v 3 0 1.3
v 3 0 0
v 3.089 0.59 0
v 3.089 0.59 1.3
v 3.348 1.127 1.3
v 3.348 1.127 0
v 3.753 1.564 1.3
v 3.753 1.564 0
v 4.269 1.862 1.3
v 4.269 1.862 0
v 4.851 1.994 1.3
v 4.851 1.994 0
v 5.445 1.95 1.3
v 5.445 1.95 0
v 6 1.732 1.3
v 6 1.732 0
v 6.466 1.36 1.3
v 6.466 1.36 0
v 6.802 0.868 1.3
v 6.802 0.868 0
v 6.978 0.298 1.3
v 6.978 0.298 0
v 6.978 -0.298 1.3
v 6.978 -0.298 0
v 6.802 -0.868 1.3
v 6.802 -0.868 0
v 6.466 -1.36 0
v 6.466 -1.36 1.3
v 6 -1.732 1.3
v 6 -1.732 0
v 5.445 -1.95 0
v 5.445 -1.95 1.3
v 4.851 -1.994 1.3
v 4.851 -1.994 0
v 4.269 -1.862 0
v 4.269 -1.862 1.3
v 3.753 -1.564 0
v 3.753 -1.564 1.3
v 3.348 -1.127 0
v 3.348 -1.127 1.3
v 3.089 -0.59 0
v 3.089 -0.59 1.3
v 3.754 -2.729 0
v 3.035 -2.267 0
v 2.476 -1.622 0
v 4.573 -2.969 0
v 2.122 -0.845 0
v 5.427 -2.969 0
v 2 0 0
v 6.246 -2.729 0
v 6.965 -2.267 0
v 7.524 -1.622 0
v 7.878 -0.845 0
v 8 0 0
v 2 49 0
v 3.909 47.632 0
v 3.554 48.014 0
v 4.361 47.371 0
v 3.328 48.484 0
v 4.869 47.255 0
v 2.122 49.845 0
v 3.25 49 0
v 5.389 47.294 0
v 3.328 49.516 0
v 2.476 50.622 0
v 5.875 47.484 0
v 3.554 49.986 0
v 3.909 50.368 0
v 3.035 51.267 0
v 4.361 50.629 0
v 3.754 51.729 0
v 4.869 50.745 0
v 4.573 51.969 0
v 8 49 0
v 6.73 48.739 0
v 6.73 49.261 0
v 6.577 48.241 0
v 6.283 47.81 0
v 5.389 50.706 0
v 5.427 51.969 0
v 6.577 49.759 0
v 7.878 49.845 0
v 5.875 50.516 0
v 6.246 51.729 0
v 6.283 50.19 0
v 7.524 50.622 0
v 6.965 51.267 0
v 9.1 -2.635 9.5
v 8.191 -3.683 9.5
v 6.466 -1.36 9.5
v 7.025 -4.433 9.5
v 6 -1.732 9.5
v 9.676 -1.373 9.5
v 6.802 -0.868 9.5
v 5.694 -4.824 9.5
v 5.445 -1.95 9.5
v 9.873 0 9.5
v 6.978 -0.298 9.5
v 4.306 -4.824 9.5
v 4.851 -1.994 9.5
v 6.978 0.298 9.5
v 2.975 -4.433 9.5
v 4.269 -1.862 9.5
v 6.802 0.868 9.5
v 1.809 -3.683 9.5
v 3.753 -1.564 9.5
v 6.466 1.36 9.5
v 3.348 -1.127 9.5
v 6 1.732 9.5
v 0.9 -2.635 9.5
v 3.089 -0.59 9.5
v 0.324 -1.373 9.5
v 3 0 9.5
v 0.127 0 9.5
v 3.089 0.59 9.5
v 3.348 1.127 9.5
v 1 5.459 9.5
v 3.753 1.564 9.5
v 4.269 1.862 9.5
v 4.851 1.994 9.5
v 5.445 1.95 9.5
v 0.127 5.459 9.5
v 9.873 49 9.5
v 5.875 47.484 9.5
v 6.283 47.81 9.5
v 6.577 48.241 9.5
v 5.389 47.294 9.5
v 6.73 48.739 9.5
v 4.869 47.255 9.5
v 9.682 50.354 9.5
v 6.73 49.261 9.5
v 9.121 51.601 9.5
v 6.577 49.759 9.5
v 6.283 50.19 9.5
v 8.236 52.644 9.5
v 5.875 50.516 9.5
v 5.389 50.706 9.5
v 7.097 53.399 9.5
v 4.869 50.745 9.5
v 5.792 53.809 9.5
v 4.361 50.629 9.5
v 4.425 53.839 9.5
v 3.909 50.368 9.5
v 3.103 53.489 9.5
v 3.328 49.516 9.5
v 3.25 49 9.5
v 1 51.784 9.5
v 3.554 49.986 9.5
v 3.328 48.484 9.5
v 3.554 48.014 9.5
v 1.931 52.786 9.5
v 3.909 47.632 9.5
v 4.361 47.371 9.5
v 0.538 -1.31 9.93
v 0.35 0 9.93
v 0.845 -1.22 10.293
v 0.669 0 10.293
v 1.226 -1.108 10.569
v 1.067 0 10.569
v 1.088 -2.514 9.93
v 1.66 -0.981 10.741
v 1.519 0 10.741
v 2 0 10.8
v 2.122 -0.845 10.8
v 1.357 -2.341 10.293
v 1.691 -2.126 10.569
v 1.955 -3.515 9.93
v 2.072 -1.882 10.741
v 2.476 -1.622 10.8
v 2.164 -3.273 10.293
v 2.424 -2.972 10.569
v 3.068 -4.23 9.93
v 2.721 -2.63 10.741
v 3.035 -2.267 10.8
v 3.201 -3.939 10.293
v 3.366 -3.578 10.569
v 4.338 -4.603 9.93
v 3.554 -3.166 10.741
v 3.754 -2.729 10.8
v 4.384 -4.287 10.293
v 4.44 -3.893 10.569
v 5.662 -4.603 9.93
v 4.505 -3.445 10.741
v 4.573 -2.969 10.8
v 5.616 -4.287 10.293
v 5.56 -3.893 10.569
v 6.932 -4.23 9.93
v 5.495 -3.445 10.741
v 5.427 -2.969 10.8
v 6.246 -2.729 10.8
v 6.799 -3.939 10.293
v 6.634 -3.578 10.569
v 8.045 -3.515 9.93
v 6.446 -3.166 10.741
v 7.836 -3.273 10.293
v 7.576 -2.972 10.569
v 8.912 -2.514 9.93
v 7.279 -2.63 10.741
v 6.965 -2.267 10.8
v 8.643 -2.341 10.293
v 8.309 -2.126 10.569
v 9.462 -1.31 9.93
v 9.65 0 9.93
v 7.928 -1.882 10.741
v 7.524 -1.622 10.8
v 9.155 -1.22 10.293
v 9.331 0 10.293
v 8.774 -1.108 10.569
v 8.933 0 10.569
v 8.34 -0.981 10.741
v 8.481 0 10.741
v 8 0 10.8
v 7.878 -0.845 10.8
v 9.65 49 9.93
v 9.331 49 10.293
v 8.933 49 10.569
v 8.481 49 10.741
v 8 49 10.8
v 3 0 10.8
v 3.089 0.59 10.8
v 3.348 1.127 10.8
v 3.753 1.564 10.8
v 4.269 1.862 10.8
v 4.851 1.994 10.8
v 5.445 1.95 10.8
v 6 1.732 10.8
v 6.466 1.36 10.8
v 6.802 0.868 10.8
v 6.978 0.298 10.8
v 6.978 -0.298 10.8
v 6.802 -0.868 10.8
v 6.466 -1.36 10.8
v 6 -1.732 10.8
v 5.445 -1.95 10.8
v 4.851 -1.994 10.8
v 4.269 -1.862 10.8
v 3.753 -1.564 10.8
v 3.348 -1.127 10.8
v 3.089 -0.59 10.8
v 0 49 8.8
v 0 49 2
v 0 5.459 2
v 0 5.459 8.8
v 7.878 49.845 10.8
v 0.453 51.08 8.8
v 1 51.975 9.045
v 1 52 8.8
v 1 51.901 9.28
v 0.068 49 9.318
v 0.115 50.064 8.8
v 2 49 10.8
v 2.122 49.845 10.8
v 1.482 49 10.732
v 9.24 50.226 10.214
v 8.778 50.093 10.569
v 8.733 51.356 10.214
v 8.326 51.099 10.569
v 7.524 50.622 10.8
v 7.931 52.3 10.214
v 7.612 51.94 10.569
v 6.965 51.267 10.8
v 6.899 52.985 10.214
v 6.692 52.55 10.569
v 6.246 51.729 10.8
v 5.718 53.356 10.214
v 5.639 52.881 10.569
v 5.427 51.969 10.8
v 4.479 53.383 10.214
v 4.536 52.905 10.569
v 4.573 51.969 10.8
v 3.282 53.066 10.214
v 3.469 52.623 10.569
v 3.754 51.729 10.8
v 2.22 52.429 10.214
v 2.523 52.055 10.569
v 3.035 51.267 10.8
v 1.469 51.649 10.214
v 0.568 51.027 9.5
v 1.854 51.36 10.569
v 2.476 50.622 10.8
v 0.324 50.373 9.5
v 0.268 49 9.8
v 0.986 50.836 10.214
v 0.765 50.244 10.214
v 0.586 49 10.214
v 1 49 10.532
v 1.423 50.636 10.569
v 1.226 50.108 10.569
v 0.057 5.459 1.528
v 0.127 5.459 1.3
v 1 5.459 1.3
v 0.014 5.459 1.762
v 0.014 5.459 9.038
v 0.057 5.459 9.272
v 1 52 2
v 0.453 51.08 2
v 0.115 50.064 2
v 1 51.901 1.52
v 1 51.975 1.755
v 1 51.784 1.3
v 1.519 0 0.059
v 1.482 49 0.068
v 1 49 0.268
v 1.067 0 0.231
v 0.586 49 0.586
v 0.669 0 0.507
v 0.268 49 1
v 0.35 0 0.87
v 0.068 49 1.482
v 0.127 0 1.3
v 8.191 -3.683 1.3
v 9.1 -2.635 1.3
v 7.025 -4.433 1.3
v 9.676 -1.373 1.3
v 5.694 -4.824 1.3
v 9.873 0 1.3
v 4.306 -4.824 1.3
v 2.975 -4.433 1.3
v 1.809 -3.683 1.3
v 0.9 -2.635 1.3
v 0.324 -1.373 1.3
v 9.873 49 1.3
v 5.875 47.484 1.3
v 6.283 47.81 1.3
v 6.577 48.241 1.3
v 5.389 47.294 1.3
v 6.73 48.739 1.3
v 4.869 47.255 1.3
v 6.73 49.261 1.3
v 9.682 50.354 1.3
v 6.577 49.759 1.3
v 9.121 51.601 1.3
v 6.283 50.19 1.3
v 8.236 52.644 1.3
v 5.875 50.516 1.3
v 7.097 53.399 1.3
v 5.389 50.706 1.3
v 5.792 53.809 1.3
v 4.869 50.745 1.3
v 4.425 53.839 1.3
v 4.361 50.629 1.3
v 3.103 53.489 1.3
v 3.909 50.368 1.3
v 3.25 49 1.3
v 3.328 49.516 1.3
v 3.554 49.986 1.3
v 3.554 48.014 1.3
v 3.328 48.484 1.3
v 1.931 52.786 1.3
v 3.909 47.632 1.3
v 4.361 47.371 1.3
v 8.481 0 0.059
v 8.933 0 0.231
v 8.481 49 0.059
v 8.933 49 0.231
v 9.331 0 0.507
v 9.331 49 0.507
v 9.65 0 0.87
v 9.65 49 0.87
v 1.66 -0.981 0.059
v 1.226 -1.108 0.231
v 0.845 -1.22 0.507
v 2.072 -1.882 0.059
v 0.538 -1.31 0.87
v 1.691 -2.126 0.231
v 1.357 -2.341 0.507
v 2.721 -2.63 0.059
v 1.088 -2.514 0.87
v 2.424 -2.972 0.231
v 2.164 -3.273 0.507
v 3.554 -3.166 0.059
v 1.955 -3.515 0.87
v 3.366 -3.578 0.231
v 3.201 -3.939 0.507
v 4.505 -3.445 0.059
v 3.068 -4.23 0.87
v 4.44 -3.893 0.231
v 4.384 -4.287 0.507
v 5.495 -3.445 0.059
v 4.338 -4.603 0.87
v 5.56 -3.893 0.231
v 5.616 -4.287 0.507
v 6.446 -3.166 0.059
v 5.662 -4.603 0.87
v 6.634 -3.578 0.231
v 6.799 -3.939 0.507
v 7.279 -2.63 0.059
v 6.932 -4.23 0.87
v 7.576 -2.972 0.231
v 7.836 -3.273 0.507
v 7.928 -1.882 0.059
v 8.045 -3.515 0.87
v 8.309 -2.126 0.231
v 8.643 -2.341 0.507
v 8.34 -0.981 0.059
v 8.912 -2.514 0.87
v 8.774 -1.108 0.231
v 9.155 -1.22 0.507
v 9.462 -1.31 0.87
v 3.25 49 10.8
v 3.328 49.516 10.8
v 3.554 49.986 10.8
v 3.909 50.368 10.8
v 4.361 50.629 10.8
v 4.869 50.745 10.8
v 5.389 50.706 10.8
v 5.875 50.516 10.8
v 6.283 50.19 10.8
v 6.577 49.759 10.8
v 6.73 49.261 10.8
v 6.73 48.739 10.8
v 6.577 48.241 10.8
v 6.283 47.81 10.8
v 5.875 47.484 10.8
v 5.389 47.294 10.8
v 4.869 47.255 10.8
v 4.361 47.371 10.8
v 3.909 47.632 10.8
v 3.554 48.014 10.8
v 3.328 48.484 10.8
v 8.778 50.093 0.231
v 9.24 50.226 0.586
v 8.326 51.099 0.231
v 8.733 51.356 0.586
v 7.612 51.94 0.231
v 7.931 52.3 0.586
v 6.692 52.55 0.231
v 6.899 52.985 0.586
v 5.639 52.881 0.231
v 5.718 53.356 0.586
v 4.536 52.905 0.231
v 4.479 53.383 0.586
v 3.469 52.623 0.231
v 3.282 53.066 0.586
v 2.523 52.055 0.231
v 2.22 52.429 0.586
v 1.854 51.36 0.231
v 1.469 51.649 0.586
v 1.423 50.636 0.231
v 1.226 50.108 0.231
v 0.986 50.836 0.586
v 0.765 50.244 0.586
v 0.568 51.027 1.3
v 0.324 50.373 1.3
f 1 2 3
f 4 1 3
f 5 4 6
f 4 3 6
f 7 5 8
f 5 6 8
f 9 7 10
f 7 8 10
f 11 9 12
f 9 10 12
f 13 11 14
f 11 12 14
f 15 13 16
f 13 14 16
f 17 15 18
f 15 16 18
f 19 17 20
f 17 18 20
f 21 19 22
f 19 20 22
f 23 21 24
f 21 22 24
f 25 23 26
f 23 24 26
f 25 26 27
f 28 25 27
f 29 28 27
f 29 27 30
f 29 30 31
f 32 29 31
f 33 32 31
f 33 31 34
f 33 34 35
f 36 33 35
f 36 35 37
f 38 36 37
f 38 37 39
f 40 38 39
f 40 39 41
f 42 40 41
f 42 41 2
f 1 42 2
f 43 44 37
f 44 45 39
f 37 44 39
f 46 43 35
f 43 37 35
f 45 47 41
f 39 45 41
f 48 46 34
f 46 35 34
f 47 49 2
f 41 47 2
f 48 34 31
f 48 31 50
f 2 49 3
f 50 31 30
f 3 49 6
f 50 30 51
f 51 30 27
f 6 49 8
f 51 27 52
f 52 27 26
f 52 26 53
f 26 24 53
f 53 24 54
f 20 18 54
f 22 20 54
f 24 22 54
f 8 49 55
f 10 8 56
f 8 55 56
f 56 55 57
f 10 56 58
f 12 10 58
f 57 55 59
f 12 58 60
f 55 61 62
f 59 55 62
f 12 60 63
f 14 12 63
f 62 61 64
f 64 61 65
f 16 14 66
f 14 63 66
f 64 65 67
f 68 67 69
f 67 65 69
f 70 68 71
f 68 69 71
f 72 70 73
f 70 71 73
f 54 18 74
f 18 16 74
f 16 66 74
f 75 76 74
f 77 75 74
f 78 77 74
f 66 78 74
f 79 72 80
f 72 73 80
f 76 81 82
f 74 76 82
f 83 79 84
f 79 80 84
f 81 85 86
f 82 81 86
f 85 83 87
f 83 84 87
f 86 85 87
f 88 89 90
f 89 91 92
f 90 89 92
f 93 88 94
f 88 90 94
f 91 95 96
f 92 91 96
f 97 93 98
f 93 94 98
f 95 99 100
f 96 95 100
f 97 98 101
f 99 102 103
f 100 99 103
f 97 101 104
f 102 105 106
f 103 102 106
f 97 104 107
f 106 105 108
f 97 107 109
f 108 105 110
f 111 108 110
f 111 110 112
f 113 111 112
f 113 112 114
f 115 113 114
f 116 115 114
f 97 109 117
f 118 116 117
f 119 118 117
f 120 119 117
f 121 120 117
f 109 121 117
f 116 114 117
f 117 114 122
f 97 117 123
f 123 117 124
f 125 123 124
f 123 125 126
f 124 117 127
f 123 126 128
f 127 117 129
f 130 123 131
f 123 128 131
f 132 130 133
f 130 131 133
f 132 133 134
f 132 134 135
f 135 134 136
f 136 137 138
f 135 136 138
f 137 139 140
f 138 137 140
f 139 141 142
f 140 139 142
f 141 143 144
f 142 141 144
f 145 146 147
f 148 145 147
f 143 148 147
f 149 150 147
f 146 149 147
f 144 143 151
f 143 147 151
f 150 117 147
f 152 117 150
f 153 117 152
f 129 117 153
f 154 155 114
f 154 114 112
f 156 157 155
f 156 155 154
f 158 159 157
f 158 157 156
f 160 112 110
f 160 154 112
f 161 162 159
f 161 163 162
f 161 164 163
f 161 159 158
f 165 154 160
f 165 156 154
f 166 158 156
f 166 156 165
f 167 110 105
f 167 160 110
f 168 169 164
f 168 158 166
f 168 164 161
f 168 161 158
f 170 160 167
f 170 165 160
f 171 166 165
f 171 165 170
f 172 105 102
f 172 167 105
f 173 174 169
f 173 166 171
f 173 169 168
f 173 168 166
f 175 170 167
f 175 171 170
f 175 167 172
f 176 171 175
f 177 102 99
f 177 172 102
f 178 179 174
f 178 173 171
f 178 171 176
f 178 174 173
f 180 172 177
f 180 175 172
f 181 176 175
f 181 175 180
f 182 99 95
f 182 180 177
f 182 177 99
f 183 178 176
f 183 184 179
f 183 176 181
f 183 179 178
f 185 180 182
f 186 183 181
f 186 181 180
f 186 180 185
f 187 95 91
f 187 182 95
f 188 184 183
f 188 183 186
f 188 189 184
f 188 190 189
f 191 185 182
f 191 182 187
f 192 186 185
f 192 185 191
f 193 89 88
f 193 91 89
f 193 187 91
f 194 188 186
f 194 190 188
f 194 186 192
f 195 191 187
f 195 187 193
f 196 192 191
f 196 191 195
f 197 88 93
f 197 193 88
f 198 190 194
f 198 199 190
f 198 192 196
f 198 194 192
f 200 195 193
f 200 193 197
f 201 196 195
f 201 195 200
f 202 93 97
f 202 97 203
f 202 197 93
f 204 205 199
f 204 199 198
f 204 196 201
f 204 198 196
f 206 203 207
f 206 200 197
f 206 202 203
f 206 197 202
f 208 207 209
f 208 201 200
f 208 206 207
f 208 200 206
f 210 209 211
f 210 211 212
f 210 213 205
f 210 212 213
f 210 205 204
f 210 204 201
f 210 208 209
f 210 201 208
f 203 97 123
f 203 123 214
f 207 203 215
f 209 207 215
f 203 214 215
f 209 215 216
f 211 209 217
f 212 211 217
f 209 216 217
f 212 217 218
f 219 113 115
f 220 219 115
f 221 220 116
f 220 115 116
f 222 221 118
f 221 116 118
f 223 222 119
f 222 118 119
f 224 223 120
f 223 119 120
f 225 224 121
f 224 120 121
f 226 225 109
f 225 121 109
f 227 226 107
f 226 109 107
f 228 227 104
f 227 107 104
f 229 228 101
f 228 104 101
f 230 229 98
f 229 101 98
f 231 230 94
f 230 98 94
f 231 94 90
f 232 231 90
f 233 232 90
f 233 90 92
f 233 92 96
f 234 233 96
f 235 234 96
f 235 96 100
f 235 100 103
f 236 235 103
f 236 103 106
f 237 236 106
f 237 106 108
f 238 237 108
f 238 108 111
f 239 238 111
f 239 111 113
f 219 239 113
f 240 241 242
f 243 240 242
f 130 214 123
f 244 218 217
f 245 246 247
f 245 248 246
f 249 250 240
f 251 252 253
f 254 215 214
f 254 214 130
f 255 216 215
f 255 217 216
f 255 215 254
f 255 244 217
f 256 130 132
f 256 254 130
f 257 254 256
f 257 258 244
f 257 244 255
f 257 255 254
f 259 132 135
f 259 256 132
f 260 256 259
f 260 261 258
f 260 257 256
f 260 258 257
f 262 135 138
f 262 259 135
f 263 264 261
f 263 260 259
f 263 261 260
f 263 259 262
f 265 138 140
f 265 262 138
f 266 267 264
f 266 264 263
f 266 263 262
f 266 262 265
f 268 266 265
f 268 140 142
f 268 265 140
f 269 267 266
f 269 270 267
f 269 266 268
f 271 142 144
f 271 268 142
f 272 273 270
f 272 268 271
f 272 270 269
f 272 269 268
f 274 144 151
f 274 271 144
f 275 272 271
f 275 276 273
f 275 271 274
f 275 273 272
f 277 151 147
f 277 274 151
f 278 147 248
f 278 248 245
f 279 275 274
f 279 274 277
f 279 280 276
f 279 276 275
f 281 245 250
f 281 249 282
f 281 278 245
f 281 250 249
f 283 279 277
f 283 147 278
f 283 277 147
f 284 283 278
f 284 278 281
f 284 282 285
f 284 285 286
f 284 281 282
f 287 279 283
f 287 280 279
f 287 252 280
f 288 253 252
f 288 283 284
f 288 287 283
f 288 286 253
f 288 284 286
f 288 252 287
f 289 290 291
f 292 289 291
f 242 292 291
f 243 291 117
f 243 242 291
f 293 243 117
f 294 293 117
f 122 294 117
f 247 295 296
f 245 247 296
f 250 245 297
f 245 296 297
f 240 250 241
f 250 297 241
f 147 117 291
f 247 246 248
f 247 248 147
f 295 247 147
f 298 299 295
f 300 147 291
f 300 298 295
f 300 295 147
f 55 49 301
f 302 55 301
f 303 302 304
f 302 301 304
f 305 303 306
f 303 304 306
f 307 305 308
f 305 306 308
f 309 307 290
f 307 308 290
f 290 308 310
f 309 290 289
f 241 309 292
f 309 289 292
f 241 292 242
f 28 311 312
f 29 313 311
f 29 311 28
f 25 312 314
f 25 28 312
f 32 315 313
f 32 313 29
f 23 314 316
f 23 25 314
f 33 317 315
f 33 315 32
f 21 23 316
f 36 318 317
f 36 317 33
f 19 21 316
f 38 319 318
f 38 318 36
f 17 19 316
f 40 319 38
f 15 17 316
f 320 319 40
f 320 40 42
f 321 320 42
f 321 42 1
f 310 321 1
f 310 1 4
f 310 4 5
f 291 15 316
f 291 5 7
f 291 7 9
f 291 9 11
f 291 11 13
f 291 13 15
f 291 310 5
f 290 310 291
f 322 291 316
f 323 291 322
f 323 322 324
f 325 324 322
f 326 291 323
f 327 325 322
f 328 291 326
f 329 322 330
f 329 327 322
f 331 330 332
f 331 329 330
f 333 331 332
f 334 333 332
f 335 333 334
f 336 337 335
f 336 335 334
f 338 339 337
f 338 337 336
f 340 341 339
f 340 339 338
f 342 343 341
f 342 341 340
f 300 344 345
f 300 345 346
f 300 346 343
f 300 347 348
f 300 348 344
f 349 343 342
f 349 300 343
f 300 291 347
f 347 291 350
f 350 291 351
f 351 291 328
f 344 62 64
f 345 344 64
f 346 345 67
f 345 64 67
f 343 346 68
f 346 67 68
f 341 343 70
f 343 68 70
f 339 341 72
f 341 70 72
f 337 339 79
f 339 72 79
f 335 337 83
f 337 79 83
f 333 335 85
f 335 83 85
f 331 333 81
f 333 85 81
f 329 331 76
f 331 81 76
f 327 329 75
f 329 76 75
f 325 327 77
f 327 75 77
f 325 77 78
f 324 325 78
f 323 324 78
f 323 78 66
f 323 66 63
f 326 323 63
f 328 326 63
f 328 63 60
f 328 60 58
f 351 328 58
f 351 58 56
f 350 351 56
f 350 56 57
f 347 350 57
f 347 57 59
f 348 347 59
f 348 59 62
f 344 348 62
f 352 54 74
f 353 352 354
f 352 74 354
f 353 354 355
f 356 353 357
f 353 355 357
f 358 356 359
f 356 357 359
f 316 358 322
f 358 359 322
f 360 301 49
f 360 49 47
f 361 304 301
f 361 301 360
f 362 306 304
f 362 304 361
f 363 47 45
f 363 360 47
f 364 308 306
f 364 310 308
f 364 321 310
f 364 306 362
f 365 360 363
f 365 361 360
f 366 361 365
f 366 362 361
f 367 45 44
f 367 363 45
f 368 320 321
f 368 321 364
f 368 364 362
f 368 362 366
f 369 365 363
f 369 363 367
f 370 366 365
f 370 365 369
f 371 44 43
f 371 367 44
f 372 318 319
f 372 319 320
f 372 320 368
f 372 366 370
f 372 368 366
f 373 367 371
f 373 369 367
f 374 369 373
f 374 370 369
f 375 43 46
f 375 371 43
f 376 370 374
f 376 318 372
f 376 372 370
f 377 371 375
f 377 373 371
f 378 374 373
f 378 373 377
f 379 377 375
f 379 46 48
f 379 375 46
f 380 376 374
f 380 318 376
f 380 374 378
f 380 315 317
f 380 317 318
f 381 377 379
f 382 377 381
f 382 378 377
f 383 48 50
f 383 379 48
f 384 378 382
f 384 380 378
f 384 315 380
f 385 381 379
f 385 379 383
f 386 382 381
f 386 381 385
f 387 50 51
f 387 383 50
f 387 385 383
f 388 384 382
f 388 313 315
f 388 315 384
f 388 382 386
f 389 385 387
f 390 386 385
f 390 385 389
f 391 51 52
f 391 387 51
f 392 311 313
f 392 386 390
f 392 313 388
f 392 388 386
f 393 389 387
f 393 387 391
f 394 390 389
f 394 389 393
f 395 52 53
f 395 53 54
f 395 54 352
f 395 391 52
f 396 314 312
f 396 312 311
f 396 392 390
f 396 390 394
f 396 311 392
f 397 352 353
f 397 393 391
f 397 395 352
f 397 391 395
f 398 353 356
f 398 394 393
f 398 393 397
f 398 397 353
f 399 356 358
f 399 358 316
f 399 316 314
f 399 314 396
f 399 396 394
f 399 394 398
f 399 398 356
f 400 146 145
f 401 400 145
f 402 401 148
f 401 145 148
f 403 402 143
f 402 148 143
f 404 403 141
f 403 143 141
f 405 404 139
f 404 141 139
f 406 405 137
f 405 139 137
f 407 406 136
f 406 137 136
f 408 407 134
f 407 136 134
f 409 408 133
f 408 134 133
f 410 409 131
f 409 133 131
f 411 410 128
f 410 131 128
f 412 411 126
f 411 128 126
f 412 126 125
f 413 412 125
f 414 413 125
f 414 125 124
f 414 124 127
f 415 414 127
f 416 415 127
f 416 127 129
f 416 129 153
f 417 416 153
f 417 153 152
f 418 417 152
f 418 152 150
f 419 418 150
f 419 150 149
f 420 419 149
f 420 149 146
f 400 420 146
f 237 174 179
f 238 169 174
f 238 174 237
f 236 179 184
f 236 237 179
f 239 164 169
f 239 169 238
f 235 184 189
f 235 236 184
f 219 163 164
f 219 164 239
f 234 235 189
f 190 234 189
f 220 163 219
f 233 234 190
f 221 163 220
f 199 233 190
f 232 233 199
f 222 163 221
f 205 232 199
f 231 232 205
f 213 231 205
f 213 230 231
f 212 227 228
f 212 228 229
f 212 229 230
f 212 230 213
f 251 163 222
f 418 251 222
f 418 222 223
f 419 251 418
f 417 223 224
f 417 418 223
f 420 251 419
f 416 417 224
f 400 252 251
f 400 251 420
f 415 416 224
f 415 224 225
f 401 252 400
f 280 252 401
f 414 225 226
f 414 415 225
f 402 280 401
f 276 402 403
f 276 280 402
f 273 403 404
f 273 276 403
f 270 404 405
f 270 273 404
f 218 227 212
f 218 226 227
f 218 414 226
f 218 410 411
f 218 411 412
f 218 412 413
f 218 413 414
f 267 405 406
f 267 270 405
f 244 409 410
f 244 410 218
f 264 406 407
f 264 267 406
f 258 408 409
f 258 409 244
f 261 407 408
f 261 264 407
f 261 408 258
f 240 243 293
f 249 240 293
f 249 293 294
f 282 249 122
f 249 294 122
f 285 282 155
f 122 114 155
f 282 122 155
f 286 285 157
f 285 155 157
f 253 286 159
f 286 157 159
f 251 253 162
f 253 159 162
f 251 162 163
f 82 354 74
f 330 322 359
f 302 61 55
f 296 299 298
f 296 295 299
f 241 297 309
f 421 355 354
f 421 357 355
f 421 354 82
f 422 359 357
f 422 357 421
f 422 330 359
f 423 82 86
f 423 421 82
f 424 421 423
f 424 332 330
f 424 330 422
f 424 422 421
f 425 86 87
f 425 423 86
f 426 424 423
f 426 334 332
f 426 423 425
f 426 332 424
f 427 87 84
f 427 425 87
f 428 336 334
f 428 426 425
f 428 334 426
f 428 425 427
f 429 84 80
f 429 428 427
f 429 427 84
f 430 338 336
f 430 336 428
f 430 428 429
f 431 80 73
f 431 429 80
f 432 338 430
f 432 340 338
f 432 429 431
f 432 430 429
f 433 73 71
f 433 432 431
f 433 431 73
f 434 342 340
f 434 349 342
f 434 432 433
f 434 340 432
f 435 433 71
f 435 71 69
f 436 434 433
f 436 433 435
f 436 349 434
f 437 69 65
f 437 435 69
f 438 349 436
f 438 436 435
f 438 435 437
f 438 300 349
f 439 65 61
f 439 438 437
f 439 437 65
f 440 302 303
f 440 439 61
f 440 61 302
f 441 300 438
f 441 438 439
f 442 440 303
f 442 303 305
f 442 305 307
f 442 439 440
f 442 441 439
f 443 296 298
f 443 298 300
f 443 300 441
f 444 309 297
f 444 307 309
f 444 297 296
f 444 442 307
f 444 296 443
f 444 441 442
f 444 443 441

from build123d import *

# Parameters (mm, degrees)
BASE_EXTRUSION_DEPTH    = 10.8
CONG_1_R                = 2
CONG_3_R                = 2
ENL_V_MAT_EXTRU_4_DEPTH = 9
ESQUISSE7_W             = 8.2
ESQUISSE7_H             = 10.06
ENL_V_MAT_EXTRU_5_DEPTH = 9
ESQUISSE8_R             = 2
ESQUISSE8_R_2           = 1.75
ENL_V_MAT_EXTRU_6_DEPTH = 56.825441717


with BuildPart() as part:
    # Esquisse1 → Base-Extrusion (new body)
    with BuildSketch(Plane.XY):
        with BuildLine():
            Line((0, 49), (0, 0))
            ThreePointArc((0, 0), (5, -5), (10, 0))
            Line((10, 0), (10, 49))
            ThreePointArc((10, 49), (5, 54), (0, 49))
        make_face()
    extrude(amount=BASE_EXTRUSION_DEPTH)

    # Congé1
    cong_1_edges = [part.edges().sort_by_distance(p)[0] for p in [
        (5, -5, 10.8),
        (10, 24.5, 10.8),
        (5, 54, 10.8),
        (0, 24.5, 10.8),
    ]]
    fillet(cong_1_edges, radius=CONG_1_R)

    # Congé3
    cong_3_edges = [part.edges().sort_by_distance(p)[0] for p in [
        (10, 24.5, 0),
        (5, -5, 0),
        (0, 24.5, 0),
        (5, 54, 0),
    ]]
    fillet(cong_3_edges, radius=CONG_3_R)

    # Esquisse6 → Enlèv. mat.-Extru.4 (cut)
    with BuildSketch(Plane(origin=(10, 0, 0), x_dir=(0, 0, -1), z_dir=(1, 0, 0))):
        Polygon((-9.5, 58.014149953), (-9.5, -9.353860788), (-1.3, -9.353860788), (-1.3, 56.548715687), align=None)
    extrude(amount=-ENL_V_MAT_EXTRU_4_DEPTH, mode=Mode.SUBTRACT)

    # Esquisse7 → Enlèv. mat.-Extru.5 (cut)
    with BuildSketch(Plane.ZY):
        with Locations((5.4, 0.429072807)):
            Rectangle(ESQUISSE7_W, ESQUISSE7_H)
    extrude(amount=-ENL_V_MAT_EXTRU_5_DEPTH, mode=Mode.SUBTRACT)

    # Esquisse8 → Enlèv. mat.-Extru.6 (cut, through all)
    with BuildSketch(Plane(origin=(0, 0, 0), x_dir=(-1, 0, 0), z_dir=(0, 0, -1))):
        with Locations((-5, 0)):
            Circle(ESQUISSE8_R)
        with Locations((-5, 49)):
            Circle(ESQUISSE8_R_2)
    extrude(amount=-ENL_V_MAT_EXTRU_6_DEPTH, mode=Mode.SUBTRACT)


solid = part.part
